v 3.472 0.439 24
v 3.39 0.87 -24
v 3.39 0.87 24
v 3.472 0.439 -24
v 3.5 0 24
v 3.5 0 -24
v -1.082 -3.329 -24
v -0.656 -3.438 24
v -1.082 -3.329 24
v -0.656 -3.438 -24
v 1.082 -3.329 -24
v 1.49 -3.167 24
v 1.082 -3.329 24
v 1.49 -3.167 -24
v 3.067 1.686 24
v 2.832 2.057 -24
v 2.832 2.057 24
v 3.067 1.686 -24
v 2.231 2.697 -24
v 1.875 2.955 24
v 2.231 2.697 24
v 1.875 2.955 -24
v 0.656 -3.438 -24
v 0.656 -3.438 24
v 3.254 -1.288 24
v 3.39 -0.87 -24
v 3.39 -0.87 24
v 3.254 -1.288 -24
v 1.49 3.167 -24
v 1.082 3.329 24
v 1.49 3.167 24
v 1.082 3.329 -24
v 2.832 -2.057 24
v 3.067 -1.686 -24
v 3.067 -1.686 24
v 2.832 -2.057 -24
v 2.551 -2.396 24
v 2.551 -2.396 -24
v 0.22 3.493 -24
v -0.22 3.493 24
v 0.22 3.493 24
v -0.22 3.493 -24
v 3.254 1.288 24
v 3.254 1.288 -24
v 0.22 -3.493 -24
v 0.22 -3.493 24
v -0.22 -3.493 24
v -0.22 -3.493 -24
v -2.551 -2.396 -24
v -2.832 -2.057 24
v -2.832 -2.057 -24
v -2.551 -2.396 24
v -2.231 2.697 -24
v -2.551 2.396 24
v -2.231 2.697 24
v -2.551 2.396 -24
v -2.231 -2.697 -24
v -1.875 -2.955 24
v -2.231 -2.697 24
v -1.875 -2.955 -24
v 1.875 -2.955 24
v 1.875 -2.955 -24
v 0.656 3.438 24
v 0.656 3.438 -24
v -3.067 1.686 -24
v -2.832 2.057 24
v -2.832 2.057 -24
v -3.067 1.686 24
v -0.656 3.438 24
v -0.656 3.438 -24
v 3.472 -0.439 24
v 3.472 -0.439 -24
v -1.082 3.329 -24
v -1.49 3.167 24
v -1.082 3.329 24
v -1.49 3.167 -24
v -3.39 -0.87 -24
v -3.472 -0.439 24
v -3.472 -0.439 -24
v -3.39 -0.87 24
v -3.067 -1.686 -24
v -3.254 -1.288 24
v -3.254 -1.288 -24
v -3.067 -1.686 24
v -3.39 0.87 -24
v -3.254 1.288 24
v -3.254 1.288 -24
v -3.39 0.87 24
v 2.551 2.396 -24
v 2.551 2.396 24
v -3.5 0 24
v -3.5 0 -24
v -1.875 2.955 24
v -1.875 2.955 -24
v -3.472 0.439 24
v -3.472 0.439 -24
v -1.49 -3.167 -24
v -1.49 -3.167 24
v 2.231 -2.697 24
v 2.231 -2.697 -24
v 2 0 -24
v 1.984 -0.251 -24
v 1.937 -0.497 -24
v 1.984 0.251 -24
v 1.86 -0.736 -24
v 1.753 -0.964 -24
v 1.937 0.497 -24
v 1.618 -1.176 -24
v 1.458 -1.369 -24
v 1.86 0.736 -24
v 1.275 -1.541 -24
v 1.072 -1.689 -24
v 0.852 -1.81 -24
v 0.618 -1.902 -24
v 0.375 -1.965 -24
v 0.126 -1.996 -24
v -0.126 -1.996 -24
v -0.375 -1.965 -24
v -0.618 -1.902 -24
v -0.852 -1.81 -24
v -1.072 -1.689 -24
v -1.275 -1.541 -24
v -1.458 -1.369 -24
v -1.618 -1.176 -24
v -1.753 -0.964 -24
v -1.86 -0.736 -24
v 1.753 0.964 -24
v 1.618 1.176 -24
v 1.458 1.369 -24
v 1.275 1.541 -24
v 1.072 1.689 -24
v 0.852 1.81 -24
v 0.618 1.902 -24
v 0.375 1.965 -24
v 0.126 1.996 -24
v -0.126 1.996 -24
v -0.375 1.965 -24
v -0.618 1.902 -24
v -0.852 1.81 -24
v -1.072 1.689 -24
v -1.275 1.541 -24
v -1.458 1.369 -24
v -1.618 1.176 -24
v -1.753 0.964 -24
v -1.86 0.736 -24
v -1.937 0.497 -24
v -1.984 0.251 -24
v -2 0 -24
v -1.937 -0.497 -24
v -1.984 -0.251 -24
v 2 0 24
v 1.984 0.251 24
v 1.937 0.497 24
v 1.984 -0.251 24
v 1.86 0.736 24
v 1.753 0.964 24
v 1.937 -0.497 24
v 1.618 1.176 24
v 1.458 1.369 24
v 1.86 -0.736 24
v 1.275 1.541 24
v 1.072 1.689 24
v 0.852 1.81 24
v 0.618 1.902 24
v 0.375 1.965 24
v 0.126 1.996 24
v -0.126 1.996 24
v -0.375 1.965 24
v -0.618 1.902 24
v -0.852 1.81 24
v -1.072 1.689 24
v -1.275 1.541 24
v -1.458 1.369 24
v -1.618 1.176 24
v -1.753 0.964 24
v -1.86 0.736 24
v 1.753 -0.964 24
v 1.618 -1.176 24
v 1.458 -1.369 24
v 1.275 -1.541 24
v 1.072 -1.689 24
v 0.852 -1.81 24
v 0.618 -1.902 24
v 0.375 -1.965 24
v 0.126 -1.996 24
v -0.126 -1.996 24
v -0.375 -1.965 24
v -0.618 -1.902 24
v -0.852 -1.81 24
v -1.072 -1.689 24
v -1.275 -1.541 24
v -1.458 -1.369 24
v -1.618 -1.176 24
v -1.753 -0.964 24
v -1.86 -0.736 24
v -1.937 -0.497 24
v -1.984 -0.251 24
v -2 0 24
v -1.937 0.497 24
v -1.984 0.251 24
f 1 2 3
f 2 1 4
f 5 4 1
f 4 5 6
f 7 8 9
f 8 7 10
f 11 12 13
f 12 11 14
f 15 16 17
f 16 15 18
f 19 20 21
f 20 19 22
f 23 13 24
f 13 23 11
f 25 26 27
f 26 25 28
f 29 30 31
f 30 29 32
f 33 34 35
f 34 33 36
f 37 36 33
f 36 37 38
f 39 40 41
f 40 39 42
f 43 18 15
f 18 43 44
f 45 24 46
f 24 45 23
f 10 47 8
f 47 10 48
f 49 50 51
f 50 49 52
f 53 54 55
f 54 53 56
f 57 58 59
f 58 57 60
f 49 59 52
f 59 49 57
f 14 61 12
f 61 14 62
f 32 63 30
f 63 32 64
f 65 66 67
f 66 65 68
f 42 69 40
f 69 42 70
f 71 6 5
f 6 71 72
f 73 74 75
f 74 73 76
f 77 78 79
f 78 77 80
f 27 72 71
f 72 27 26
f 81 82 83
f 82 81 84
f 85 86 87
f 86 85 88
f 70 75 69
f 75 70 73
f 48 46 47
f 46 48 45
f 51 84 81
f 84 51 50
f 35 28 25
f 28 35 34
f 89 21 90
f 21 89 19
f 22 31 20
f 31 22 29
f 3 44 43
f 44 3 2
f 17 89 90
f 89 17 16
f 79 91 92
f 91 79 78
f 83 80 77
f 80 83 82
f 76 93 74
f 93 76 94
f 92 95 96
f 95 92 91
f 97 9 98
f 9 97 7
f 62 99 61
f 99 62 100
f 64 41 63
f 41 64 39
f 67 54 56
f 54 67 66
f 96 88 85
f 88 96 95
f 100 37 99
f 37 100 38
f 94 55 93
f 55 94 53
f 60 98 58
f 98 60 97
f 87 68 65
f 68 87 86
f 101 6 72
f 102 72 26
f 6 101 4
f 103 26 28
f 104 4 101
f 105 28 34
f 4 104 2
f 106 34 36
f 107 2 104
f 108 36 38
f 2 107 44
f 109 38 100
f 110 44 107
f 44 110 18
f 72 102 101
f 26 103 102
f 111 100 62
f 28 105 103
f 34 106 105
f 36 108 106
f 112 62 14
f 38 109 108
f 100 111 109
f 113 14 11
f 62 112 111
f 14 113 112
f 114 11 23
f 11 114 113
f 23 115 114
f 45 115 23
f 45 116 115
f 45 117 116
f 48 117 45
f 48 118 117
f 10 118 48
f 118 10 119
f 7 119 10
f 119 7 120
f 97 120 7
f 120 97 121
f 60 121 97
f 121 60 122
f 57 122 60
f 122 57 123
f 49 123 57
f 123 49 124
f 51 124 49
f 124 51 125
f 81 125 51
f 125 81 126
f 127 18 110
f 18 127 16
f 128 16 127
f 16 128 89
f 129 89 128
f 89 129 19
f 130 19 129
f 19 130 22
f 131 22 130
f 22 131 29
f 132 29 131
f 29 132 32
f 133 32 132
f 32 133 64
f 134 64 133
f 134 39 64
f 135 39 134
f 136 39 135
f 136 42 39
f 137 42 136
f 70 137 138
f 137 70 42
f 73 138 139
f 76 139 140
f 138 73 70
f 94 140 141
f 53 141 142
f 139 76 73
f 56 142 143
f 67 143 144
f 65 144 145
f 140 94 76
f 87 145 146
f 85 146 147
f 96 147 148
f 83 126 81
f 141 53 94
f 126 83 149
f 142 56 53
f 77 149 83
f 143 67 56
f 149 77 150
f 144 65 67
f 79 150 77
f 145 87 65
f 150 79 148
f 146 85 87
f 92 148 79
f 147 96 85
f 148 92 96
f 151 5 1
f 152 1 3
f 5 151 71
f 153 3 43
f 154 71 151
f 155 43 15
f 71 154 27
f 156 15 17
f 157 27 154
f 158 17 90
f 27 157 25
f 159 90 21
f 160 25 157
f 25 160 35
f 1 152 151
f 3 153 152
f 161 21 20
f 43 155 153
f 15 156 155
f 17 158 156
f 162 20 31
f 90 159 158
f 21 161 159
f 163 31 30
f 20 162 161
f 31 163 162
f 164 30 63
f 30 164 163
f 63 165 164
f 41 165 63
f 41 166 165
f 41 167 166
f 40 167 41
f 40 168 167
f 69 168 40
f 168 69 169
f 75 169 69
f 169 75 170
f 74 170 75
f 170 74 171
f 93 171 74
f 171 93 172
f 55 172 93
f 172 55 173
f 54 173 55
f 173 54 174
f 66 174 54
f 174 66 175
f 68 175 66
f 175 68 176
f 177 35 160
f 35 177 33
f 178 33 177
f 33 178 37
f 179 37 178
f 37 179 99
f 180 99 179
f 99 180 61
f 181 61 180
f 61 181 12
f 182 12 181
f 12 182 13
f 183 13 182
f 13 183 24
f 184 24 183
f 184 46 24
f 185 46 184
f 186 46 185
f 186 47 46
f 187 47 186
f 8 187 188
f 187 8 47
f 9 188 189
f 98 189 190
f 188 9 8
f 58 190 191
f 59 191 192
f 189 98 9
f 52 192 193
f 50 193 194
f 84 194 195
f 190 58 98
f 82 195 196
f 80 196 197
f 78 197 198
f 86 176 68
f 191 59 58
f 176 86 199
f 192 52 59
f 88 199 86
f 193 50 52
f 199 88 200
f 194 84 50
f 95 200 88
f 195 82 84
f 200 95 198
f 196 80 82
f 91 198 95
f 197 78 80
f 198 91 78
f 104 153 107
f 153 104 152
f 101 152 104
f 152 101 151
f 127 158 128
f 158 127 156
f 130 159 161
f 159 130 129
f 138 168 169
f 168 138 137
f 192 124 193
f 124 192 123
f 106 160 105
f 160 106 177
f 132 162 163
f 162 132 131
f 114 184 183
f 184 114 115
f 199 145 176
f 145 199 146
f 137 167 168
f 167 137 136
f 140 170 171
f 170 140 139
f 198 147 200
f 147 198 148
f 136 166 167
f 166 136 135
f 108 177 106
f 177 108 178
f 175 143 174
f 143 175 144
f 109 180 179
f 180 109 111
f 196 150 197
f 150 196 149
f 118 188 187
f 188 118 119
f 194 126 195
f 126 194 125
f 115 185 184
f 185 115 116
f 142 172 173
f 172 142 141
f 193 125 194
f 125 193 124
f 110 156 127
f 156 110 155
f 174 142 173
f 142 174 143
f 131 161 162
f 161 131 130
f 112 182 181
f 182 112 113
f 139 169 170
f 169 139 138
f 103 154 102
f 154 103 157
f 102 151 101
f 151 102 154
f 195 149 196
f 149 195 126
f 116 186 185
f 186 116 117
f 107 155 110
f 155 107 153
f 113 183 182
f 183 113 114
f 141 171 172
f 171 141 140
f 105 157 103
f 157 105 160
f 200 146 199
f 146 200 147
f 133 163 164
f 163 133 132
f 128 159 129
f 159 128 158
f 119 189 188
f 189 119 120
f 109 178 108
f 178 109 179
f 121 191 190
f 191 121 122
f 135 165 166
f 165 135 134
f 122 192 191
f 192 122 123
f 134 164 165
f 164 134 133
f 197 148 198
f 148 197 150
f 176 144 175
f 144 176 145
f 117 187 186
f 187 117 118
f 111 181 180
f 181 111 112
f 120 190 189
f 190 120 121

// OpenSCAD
$fn = 50;


difference() {
	union() {
		translate(v = [0, 0, -24.0000000000]) {
			cylinder(h = 48, r = 3.5000000000);
		}
	}
	union() {
		translate(v = [0, 0, -100.0000000000]) {
			cylinder(h = 200, r = 2.0000000000);
		}
	}
}
